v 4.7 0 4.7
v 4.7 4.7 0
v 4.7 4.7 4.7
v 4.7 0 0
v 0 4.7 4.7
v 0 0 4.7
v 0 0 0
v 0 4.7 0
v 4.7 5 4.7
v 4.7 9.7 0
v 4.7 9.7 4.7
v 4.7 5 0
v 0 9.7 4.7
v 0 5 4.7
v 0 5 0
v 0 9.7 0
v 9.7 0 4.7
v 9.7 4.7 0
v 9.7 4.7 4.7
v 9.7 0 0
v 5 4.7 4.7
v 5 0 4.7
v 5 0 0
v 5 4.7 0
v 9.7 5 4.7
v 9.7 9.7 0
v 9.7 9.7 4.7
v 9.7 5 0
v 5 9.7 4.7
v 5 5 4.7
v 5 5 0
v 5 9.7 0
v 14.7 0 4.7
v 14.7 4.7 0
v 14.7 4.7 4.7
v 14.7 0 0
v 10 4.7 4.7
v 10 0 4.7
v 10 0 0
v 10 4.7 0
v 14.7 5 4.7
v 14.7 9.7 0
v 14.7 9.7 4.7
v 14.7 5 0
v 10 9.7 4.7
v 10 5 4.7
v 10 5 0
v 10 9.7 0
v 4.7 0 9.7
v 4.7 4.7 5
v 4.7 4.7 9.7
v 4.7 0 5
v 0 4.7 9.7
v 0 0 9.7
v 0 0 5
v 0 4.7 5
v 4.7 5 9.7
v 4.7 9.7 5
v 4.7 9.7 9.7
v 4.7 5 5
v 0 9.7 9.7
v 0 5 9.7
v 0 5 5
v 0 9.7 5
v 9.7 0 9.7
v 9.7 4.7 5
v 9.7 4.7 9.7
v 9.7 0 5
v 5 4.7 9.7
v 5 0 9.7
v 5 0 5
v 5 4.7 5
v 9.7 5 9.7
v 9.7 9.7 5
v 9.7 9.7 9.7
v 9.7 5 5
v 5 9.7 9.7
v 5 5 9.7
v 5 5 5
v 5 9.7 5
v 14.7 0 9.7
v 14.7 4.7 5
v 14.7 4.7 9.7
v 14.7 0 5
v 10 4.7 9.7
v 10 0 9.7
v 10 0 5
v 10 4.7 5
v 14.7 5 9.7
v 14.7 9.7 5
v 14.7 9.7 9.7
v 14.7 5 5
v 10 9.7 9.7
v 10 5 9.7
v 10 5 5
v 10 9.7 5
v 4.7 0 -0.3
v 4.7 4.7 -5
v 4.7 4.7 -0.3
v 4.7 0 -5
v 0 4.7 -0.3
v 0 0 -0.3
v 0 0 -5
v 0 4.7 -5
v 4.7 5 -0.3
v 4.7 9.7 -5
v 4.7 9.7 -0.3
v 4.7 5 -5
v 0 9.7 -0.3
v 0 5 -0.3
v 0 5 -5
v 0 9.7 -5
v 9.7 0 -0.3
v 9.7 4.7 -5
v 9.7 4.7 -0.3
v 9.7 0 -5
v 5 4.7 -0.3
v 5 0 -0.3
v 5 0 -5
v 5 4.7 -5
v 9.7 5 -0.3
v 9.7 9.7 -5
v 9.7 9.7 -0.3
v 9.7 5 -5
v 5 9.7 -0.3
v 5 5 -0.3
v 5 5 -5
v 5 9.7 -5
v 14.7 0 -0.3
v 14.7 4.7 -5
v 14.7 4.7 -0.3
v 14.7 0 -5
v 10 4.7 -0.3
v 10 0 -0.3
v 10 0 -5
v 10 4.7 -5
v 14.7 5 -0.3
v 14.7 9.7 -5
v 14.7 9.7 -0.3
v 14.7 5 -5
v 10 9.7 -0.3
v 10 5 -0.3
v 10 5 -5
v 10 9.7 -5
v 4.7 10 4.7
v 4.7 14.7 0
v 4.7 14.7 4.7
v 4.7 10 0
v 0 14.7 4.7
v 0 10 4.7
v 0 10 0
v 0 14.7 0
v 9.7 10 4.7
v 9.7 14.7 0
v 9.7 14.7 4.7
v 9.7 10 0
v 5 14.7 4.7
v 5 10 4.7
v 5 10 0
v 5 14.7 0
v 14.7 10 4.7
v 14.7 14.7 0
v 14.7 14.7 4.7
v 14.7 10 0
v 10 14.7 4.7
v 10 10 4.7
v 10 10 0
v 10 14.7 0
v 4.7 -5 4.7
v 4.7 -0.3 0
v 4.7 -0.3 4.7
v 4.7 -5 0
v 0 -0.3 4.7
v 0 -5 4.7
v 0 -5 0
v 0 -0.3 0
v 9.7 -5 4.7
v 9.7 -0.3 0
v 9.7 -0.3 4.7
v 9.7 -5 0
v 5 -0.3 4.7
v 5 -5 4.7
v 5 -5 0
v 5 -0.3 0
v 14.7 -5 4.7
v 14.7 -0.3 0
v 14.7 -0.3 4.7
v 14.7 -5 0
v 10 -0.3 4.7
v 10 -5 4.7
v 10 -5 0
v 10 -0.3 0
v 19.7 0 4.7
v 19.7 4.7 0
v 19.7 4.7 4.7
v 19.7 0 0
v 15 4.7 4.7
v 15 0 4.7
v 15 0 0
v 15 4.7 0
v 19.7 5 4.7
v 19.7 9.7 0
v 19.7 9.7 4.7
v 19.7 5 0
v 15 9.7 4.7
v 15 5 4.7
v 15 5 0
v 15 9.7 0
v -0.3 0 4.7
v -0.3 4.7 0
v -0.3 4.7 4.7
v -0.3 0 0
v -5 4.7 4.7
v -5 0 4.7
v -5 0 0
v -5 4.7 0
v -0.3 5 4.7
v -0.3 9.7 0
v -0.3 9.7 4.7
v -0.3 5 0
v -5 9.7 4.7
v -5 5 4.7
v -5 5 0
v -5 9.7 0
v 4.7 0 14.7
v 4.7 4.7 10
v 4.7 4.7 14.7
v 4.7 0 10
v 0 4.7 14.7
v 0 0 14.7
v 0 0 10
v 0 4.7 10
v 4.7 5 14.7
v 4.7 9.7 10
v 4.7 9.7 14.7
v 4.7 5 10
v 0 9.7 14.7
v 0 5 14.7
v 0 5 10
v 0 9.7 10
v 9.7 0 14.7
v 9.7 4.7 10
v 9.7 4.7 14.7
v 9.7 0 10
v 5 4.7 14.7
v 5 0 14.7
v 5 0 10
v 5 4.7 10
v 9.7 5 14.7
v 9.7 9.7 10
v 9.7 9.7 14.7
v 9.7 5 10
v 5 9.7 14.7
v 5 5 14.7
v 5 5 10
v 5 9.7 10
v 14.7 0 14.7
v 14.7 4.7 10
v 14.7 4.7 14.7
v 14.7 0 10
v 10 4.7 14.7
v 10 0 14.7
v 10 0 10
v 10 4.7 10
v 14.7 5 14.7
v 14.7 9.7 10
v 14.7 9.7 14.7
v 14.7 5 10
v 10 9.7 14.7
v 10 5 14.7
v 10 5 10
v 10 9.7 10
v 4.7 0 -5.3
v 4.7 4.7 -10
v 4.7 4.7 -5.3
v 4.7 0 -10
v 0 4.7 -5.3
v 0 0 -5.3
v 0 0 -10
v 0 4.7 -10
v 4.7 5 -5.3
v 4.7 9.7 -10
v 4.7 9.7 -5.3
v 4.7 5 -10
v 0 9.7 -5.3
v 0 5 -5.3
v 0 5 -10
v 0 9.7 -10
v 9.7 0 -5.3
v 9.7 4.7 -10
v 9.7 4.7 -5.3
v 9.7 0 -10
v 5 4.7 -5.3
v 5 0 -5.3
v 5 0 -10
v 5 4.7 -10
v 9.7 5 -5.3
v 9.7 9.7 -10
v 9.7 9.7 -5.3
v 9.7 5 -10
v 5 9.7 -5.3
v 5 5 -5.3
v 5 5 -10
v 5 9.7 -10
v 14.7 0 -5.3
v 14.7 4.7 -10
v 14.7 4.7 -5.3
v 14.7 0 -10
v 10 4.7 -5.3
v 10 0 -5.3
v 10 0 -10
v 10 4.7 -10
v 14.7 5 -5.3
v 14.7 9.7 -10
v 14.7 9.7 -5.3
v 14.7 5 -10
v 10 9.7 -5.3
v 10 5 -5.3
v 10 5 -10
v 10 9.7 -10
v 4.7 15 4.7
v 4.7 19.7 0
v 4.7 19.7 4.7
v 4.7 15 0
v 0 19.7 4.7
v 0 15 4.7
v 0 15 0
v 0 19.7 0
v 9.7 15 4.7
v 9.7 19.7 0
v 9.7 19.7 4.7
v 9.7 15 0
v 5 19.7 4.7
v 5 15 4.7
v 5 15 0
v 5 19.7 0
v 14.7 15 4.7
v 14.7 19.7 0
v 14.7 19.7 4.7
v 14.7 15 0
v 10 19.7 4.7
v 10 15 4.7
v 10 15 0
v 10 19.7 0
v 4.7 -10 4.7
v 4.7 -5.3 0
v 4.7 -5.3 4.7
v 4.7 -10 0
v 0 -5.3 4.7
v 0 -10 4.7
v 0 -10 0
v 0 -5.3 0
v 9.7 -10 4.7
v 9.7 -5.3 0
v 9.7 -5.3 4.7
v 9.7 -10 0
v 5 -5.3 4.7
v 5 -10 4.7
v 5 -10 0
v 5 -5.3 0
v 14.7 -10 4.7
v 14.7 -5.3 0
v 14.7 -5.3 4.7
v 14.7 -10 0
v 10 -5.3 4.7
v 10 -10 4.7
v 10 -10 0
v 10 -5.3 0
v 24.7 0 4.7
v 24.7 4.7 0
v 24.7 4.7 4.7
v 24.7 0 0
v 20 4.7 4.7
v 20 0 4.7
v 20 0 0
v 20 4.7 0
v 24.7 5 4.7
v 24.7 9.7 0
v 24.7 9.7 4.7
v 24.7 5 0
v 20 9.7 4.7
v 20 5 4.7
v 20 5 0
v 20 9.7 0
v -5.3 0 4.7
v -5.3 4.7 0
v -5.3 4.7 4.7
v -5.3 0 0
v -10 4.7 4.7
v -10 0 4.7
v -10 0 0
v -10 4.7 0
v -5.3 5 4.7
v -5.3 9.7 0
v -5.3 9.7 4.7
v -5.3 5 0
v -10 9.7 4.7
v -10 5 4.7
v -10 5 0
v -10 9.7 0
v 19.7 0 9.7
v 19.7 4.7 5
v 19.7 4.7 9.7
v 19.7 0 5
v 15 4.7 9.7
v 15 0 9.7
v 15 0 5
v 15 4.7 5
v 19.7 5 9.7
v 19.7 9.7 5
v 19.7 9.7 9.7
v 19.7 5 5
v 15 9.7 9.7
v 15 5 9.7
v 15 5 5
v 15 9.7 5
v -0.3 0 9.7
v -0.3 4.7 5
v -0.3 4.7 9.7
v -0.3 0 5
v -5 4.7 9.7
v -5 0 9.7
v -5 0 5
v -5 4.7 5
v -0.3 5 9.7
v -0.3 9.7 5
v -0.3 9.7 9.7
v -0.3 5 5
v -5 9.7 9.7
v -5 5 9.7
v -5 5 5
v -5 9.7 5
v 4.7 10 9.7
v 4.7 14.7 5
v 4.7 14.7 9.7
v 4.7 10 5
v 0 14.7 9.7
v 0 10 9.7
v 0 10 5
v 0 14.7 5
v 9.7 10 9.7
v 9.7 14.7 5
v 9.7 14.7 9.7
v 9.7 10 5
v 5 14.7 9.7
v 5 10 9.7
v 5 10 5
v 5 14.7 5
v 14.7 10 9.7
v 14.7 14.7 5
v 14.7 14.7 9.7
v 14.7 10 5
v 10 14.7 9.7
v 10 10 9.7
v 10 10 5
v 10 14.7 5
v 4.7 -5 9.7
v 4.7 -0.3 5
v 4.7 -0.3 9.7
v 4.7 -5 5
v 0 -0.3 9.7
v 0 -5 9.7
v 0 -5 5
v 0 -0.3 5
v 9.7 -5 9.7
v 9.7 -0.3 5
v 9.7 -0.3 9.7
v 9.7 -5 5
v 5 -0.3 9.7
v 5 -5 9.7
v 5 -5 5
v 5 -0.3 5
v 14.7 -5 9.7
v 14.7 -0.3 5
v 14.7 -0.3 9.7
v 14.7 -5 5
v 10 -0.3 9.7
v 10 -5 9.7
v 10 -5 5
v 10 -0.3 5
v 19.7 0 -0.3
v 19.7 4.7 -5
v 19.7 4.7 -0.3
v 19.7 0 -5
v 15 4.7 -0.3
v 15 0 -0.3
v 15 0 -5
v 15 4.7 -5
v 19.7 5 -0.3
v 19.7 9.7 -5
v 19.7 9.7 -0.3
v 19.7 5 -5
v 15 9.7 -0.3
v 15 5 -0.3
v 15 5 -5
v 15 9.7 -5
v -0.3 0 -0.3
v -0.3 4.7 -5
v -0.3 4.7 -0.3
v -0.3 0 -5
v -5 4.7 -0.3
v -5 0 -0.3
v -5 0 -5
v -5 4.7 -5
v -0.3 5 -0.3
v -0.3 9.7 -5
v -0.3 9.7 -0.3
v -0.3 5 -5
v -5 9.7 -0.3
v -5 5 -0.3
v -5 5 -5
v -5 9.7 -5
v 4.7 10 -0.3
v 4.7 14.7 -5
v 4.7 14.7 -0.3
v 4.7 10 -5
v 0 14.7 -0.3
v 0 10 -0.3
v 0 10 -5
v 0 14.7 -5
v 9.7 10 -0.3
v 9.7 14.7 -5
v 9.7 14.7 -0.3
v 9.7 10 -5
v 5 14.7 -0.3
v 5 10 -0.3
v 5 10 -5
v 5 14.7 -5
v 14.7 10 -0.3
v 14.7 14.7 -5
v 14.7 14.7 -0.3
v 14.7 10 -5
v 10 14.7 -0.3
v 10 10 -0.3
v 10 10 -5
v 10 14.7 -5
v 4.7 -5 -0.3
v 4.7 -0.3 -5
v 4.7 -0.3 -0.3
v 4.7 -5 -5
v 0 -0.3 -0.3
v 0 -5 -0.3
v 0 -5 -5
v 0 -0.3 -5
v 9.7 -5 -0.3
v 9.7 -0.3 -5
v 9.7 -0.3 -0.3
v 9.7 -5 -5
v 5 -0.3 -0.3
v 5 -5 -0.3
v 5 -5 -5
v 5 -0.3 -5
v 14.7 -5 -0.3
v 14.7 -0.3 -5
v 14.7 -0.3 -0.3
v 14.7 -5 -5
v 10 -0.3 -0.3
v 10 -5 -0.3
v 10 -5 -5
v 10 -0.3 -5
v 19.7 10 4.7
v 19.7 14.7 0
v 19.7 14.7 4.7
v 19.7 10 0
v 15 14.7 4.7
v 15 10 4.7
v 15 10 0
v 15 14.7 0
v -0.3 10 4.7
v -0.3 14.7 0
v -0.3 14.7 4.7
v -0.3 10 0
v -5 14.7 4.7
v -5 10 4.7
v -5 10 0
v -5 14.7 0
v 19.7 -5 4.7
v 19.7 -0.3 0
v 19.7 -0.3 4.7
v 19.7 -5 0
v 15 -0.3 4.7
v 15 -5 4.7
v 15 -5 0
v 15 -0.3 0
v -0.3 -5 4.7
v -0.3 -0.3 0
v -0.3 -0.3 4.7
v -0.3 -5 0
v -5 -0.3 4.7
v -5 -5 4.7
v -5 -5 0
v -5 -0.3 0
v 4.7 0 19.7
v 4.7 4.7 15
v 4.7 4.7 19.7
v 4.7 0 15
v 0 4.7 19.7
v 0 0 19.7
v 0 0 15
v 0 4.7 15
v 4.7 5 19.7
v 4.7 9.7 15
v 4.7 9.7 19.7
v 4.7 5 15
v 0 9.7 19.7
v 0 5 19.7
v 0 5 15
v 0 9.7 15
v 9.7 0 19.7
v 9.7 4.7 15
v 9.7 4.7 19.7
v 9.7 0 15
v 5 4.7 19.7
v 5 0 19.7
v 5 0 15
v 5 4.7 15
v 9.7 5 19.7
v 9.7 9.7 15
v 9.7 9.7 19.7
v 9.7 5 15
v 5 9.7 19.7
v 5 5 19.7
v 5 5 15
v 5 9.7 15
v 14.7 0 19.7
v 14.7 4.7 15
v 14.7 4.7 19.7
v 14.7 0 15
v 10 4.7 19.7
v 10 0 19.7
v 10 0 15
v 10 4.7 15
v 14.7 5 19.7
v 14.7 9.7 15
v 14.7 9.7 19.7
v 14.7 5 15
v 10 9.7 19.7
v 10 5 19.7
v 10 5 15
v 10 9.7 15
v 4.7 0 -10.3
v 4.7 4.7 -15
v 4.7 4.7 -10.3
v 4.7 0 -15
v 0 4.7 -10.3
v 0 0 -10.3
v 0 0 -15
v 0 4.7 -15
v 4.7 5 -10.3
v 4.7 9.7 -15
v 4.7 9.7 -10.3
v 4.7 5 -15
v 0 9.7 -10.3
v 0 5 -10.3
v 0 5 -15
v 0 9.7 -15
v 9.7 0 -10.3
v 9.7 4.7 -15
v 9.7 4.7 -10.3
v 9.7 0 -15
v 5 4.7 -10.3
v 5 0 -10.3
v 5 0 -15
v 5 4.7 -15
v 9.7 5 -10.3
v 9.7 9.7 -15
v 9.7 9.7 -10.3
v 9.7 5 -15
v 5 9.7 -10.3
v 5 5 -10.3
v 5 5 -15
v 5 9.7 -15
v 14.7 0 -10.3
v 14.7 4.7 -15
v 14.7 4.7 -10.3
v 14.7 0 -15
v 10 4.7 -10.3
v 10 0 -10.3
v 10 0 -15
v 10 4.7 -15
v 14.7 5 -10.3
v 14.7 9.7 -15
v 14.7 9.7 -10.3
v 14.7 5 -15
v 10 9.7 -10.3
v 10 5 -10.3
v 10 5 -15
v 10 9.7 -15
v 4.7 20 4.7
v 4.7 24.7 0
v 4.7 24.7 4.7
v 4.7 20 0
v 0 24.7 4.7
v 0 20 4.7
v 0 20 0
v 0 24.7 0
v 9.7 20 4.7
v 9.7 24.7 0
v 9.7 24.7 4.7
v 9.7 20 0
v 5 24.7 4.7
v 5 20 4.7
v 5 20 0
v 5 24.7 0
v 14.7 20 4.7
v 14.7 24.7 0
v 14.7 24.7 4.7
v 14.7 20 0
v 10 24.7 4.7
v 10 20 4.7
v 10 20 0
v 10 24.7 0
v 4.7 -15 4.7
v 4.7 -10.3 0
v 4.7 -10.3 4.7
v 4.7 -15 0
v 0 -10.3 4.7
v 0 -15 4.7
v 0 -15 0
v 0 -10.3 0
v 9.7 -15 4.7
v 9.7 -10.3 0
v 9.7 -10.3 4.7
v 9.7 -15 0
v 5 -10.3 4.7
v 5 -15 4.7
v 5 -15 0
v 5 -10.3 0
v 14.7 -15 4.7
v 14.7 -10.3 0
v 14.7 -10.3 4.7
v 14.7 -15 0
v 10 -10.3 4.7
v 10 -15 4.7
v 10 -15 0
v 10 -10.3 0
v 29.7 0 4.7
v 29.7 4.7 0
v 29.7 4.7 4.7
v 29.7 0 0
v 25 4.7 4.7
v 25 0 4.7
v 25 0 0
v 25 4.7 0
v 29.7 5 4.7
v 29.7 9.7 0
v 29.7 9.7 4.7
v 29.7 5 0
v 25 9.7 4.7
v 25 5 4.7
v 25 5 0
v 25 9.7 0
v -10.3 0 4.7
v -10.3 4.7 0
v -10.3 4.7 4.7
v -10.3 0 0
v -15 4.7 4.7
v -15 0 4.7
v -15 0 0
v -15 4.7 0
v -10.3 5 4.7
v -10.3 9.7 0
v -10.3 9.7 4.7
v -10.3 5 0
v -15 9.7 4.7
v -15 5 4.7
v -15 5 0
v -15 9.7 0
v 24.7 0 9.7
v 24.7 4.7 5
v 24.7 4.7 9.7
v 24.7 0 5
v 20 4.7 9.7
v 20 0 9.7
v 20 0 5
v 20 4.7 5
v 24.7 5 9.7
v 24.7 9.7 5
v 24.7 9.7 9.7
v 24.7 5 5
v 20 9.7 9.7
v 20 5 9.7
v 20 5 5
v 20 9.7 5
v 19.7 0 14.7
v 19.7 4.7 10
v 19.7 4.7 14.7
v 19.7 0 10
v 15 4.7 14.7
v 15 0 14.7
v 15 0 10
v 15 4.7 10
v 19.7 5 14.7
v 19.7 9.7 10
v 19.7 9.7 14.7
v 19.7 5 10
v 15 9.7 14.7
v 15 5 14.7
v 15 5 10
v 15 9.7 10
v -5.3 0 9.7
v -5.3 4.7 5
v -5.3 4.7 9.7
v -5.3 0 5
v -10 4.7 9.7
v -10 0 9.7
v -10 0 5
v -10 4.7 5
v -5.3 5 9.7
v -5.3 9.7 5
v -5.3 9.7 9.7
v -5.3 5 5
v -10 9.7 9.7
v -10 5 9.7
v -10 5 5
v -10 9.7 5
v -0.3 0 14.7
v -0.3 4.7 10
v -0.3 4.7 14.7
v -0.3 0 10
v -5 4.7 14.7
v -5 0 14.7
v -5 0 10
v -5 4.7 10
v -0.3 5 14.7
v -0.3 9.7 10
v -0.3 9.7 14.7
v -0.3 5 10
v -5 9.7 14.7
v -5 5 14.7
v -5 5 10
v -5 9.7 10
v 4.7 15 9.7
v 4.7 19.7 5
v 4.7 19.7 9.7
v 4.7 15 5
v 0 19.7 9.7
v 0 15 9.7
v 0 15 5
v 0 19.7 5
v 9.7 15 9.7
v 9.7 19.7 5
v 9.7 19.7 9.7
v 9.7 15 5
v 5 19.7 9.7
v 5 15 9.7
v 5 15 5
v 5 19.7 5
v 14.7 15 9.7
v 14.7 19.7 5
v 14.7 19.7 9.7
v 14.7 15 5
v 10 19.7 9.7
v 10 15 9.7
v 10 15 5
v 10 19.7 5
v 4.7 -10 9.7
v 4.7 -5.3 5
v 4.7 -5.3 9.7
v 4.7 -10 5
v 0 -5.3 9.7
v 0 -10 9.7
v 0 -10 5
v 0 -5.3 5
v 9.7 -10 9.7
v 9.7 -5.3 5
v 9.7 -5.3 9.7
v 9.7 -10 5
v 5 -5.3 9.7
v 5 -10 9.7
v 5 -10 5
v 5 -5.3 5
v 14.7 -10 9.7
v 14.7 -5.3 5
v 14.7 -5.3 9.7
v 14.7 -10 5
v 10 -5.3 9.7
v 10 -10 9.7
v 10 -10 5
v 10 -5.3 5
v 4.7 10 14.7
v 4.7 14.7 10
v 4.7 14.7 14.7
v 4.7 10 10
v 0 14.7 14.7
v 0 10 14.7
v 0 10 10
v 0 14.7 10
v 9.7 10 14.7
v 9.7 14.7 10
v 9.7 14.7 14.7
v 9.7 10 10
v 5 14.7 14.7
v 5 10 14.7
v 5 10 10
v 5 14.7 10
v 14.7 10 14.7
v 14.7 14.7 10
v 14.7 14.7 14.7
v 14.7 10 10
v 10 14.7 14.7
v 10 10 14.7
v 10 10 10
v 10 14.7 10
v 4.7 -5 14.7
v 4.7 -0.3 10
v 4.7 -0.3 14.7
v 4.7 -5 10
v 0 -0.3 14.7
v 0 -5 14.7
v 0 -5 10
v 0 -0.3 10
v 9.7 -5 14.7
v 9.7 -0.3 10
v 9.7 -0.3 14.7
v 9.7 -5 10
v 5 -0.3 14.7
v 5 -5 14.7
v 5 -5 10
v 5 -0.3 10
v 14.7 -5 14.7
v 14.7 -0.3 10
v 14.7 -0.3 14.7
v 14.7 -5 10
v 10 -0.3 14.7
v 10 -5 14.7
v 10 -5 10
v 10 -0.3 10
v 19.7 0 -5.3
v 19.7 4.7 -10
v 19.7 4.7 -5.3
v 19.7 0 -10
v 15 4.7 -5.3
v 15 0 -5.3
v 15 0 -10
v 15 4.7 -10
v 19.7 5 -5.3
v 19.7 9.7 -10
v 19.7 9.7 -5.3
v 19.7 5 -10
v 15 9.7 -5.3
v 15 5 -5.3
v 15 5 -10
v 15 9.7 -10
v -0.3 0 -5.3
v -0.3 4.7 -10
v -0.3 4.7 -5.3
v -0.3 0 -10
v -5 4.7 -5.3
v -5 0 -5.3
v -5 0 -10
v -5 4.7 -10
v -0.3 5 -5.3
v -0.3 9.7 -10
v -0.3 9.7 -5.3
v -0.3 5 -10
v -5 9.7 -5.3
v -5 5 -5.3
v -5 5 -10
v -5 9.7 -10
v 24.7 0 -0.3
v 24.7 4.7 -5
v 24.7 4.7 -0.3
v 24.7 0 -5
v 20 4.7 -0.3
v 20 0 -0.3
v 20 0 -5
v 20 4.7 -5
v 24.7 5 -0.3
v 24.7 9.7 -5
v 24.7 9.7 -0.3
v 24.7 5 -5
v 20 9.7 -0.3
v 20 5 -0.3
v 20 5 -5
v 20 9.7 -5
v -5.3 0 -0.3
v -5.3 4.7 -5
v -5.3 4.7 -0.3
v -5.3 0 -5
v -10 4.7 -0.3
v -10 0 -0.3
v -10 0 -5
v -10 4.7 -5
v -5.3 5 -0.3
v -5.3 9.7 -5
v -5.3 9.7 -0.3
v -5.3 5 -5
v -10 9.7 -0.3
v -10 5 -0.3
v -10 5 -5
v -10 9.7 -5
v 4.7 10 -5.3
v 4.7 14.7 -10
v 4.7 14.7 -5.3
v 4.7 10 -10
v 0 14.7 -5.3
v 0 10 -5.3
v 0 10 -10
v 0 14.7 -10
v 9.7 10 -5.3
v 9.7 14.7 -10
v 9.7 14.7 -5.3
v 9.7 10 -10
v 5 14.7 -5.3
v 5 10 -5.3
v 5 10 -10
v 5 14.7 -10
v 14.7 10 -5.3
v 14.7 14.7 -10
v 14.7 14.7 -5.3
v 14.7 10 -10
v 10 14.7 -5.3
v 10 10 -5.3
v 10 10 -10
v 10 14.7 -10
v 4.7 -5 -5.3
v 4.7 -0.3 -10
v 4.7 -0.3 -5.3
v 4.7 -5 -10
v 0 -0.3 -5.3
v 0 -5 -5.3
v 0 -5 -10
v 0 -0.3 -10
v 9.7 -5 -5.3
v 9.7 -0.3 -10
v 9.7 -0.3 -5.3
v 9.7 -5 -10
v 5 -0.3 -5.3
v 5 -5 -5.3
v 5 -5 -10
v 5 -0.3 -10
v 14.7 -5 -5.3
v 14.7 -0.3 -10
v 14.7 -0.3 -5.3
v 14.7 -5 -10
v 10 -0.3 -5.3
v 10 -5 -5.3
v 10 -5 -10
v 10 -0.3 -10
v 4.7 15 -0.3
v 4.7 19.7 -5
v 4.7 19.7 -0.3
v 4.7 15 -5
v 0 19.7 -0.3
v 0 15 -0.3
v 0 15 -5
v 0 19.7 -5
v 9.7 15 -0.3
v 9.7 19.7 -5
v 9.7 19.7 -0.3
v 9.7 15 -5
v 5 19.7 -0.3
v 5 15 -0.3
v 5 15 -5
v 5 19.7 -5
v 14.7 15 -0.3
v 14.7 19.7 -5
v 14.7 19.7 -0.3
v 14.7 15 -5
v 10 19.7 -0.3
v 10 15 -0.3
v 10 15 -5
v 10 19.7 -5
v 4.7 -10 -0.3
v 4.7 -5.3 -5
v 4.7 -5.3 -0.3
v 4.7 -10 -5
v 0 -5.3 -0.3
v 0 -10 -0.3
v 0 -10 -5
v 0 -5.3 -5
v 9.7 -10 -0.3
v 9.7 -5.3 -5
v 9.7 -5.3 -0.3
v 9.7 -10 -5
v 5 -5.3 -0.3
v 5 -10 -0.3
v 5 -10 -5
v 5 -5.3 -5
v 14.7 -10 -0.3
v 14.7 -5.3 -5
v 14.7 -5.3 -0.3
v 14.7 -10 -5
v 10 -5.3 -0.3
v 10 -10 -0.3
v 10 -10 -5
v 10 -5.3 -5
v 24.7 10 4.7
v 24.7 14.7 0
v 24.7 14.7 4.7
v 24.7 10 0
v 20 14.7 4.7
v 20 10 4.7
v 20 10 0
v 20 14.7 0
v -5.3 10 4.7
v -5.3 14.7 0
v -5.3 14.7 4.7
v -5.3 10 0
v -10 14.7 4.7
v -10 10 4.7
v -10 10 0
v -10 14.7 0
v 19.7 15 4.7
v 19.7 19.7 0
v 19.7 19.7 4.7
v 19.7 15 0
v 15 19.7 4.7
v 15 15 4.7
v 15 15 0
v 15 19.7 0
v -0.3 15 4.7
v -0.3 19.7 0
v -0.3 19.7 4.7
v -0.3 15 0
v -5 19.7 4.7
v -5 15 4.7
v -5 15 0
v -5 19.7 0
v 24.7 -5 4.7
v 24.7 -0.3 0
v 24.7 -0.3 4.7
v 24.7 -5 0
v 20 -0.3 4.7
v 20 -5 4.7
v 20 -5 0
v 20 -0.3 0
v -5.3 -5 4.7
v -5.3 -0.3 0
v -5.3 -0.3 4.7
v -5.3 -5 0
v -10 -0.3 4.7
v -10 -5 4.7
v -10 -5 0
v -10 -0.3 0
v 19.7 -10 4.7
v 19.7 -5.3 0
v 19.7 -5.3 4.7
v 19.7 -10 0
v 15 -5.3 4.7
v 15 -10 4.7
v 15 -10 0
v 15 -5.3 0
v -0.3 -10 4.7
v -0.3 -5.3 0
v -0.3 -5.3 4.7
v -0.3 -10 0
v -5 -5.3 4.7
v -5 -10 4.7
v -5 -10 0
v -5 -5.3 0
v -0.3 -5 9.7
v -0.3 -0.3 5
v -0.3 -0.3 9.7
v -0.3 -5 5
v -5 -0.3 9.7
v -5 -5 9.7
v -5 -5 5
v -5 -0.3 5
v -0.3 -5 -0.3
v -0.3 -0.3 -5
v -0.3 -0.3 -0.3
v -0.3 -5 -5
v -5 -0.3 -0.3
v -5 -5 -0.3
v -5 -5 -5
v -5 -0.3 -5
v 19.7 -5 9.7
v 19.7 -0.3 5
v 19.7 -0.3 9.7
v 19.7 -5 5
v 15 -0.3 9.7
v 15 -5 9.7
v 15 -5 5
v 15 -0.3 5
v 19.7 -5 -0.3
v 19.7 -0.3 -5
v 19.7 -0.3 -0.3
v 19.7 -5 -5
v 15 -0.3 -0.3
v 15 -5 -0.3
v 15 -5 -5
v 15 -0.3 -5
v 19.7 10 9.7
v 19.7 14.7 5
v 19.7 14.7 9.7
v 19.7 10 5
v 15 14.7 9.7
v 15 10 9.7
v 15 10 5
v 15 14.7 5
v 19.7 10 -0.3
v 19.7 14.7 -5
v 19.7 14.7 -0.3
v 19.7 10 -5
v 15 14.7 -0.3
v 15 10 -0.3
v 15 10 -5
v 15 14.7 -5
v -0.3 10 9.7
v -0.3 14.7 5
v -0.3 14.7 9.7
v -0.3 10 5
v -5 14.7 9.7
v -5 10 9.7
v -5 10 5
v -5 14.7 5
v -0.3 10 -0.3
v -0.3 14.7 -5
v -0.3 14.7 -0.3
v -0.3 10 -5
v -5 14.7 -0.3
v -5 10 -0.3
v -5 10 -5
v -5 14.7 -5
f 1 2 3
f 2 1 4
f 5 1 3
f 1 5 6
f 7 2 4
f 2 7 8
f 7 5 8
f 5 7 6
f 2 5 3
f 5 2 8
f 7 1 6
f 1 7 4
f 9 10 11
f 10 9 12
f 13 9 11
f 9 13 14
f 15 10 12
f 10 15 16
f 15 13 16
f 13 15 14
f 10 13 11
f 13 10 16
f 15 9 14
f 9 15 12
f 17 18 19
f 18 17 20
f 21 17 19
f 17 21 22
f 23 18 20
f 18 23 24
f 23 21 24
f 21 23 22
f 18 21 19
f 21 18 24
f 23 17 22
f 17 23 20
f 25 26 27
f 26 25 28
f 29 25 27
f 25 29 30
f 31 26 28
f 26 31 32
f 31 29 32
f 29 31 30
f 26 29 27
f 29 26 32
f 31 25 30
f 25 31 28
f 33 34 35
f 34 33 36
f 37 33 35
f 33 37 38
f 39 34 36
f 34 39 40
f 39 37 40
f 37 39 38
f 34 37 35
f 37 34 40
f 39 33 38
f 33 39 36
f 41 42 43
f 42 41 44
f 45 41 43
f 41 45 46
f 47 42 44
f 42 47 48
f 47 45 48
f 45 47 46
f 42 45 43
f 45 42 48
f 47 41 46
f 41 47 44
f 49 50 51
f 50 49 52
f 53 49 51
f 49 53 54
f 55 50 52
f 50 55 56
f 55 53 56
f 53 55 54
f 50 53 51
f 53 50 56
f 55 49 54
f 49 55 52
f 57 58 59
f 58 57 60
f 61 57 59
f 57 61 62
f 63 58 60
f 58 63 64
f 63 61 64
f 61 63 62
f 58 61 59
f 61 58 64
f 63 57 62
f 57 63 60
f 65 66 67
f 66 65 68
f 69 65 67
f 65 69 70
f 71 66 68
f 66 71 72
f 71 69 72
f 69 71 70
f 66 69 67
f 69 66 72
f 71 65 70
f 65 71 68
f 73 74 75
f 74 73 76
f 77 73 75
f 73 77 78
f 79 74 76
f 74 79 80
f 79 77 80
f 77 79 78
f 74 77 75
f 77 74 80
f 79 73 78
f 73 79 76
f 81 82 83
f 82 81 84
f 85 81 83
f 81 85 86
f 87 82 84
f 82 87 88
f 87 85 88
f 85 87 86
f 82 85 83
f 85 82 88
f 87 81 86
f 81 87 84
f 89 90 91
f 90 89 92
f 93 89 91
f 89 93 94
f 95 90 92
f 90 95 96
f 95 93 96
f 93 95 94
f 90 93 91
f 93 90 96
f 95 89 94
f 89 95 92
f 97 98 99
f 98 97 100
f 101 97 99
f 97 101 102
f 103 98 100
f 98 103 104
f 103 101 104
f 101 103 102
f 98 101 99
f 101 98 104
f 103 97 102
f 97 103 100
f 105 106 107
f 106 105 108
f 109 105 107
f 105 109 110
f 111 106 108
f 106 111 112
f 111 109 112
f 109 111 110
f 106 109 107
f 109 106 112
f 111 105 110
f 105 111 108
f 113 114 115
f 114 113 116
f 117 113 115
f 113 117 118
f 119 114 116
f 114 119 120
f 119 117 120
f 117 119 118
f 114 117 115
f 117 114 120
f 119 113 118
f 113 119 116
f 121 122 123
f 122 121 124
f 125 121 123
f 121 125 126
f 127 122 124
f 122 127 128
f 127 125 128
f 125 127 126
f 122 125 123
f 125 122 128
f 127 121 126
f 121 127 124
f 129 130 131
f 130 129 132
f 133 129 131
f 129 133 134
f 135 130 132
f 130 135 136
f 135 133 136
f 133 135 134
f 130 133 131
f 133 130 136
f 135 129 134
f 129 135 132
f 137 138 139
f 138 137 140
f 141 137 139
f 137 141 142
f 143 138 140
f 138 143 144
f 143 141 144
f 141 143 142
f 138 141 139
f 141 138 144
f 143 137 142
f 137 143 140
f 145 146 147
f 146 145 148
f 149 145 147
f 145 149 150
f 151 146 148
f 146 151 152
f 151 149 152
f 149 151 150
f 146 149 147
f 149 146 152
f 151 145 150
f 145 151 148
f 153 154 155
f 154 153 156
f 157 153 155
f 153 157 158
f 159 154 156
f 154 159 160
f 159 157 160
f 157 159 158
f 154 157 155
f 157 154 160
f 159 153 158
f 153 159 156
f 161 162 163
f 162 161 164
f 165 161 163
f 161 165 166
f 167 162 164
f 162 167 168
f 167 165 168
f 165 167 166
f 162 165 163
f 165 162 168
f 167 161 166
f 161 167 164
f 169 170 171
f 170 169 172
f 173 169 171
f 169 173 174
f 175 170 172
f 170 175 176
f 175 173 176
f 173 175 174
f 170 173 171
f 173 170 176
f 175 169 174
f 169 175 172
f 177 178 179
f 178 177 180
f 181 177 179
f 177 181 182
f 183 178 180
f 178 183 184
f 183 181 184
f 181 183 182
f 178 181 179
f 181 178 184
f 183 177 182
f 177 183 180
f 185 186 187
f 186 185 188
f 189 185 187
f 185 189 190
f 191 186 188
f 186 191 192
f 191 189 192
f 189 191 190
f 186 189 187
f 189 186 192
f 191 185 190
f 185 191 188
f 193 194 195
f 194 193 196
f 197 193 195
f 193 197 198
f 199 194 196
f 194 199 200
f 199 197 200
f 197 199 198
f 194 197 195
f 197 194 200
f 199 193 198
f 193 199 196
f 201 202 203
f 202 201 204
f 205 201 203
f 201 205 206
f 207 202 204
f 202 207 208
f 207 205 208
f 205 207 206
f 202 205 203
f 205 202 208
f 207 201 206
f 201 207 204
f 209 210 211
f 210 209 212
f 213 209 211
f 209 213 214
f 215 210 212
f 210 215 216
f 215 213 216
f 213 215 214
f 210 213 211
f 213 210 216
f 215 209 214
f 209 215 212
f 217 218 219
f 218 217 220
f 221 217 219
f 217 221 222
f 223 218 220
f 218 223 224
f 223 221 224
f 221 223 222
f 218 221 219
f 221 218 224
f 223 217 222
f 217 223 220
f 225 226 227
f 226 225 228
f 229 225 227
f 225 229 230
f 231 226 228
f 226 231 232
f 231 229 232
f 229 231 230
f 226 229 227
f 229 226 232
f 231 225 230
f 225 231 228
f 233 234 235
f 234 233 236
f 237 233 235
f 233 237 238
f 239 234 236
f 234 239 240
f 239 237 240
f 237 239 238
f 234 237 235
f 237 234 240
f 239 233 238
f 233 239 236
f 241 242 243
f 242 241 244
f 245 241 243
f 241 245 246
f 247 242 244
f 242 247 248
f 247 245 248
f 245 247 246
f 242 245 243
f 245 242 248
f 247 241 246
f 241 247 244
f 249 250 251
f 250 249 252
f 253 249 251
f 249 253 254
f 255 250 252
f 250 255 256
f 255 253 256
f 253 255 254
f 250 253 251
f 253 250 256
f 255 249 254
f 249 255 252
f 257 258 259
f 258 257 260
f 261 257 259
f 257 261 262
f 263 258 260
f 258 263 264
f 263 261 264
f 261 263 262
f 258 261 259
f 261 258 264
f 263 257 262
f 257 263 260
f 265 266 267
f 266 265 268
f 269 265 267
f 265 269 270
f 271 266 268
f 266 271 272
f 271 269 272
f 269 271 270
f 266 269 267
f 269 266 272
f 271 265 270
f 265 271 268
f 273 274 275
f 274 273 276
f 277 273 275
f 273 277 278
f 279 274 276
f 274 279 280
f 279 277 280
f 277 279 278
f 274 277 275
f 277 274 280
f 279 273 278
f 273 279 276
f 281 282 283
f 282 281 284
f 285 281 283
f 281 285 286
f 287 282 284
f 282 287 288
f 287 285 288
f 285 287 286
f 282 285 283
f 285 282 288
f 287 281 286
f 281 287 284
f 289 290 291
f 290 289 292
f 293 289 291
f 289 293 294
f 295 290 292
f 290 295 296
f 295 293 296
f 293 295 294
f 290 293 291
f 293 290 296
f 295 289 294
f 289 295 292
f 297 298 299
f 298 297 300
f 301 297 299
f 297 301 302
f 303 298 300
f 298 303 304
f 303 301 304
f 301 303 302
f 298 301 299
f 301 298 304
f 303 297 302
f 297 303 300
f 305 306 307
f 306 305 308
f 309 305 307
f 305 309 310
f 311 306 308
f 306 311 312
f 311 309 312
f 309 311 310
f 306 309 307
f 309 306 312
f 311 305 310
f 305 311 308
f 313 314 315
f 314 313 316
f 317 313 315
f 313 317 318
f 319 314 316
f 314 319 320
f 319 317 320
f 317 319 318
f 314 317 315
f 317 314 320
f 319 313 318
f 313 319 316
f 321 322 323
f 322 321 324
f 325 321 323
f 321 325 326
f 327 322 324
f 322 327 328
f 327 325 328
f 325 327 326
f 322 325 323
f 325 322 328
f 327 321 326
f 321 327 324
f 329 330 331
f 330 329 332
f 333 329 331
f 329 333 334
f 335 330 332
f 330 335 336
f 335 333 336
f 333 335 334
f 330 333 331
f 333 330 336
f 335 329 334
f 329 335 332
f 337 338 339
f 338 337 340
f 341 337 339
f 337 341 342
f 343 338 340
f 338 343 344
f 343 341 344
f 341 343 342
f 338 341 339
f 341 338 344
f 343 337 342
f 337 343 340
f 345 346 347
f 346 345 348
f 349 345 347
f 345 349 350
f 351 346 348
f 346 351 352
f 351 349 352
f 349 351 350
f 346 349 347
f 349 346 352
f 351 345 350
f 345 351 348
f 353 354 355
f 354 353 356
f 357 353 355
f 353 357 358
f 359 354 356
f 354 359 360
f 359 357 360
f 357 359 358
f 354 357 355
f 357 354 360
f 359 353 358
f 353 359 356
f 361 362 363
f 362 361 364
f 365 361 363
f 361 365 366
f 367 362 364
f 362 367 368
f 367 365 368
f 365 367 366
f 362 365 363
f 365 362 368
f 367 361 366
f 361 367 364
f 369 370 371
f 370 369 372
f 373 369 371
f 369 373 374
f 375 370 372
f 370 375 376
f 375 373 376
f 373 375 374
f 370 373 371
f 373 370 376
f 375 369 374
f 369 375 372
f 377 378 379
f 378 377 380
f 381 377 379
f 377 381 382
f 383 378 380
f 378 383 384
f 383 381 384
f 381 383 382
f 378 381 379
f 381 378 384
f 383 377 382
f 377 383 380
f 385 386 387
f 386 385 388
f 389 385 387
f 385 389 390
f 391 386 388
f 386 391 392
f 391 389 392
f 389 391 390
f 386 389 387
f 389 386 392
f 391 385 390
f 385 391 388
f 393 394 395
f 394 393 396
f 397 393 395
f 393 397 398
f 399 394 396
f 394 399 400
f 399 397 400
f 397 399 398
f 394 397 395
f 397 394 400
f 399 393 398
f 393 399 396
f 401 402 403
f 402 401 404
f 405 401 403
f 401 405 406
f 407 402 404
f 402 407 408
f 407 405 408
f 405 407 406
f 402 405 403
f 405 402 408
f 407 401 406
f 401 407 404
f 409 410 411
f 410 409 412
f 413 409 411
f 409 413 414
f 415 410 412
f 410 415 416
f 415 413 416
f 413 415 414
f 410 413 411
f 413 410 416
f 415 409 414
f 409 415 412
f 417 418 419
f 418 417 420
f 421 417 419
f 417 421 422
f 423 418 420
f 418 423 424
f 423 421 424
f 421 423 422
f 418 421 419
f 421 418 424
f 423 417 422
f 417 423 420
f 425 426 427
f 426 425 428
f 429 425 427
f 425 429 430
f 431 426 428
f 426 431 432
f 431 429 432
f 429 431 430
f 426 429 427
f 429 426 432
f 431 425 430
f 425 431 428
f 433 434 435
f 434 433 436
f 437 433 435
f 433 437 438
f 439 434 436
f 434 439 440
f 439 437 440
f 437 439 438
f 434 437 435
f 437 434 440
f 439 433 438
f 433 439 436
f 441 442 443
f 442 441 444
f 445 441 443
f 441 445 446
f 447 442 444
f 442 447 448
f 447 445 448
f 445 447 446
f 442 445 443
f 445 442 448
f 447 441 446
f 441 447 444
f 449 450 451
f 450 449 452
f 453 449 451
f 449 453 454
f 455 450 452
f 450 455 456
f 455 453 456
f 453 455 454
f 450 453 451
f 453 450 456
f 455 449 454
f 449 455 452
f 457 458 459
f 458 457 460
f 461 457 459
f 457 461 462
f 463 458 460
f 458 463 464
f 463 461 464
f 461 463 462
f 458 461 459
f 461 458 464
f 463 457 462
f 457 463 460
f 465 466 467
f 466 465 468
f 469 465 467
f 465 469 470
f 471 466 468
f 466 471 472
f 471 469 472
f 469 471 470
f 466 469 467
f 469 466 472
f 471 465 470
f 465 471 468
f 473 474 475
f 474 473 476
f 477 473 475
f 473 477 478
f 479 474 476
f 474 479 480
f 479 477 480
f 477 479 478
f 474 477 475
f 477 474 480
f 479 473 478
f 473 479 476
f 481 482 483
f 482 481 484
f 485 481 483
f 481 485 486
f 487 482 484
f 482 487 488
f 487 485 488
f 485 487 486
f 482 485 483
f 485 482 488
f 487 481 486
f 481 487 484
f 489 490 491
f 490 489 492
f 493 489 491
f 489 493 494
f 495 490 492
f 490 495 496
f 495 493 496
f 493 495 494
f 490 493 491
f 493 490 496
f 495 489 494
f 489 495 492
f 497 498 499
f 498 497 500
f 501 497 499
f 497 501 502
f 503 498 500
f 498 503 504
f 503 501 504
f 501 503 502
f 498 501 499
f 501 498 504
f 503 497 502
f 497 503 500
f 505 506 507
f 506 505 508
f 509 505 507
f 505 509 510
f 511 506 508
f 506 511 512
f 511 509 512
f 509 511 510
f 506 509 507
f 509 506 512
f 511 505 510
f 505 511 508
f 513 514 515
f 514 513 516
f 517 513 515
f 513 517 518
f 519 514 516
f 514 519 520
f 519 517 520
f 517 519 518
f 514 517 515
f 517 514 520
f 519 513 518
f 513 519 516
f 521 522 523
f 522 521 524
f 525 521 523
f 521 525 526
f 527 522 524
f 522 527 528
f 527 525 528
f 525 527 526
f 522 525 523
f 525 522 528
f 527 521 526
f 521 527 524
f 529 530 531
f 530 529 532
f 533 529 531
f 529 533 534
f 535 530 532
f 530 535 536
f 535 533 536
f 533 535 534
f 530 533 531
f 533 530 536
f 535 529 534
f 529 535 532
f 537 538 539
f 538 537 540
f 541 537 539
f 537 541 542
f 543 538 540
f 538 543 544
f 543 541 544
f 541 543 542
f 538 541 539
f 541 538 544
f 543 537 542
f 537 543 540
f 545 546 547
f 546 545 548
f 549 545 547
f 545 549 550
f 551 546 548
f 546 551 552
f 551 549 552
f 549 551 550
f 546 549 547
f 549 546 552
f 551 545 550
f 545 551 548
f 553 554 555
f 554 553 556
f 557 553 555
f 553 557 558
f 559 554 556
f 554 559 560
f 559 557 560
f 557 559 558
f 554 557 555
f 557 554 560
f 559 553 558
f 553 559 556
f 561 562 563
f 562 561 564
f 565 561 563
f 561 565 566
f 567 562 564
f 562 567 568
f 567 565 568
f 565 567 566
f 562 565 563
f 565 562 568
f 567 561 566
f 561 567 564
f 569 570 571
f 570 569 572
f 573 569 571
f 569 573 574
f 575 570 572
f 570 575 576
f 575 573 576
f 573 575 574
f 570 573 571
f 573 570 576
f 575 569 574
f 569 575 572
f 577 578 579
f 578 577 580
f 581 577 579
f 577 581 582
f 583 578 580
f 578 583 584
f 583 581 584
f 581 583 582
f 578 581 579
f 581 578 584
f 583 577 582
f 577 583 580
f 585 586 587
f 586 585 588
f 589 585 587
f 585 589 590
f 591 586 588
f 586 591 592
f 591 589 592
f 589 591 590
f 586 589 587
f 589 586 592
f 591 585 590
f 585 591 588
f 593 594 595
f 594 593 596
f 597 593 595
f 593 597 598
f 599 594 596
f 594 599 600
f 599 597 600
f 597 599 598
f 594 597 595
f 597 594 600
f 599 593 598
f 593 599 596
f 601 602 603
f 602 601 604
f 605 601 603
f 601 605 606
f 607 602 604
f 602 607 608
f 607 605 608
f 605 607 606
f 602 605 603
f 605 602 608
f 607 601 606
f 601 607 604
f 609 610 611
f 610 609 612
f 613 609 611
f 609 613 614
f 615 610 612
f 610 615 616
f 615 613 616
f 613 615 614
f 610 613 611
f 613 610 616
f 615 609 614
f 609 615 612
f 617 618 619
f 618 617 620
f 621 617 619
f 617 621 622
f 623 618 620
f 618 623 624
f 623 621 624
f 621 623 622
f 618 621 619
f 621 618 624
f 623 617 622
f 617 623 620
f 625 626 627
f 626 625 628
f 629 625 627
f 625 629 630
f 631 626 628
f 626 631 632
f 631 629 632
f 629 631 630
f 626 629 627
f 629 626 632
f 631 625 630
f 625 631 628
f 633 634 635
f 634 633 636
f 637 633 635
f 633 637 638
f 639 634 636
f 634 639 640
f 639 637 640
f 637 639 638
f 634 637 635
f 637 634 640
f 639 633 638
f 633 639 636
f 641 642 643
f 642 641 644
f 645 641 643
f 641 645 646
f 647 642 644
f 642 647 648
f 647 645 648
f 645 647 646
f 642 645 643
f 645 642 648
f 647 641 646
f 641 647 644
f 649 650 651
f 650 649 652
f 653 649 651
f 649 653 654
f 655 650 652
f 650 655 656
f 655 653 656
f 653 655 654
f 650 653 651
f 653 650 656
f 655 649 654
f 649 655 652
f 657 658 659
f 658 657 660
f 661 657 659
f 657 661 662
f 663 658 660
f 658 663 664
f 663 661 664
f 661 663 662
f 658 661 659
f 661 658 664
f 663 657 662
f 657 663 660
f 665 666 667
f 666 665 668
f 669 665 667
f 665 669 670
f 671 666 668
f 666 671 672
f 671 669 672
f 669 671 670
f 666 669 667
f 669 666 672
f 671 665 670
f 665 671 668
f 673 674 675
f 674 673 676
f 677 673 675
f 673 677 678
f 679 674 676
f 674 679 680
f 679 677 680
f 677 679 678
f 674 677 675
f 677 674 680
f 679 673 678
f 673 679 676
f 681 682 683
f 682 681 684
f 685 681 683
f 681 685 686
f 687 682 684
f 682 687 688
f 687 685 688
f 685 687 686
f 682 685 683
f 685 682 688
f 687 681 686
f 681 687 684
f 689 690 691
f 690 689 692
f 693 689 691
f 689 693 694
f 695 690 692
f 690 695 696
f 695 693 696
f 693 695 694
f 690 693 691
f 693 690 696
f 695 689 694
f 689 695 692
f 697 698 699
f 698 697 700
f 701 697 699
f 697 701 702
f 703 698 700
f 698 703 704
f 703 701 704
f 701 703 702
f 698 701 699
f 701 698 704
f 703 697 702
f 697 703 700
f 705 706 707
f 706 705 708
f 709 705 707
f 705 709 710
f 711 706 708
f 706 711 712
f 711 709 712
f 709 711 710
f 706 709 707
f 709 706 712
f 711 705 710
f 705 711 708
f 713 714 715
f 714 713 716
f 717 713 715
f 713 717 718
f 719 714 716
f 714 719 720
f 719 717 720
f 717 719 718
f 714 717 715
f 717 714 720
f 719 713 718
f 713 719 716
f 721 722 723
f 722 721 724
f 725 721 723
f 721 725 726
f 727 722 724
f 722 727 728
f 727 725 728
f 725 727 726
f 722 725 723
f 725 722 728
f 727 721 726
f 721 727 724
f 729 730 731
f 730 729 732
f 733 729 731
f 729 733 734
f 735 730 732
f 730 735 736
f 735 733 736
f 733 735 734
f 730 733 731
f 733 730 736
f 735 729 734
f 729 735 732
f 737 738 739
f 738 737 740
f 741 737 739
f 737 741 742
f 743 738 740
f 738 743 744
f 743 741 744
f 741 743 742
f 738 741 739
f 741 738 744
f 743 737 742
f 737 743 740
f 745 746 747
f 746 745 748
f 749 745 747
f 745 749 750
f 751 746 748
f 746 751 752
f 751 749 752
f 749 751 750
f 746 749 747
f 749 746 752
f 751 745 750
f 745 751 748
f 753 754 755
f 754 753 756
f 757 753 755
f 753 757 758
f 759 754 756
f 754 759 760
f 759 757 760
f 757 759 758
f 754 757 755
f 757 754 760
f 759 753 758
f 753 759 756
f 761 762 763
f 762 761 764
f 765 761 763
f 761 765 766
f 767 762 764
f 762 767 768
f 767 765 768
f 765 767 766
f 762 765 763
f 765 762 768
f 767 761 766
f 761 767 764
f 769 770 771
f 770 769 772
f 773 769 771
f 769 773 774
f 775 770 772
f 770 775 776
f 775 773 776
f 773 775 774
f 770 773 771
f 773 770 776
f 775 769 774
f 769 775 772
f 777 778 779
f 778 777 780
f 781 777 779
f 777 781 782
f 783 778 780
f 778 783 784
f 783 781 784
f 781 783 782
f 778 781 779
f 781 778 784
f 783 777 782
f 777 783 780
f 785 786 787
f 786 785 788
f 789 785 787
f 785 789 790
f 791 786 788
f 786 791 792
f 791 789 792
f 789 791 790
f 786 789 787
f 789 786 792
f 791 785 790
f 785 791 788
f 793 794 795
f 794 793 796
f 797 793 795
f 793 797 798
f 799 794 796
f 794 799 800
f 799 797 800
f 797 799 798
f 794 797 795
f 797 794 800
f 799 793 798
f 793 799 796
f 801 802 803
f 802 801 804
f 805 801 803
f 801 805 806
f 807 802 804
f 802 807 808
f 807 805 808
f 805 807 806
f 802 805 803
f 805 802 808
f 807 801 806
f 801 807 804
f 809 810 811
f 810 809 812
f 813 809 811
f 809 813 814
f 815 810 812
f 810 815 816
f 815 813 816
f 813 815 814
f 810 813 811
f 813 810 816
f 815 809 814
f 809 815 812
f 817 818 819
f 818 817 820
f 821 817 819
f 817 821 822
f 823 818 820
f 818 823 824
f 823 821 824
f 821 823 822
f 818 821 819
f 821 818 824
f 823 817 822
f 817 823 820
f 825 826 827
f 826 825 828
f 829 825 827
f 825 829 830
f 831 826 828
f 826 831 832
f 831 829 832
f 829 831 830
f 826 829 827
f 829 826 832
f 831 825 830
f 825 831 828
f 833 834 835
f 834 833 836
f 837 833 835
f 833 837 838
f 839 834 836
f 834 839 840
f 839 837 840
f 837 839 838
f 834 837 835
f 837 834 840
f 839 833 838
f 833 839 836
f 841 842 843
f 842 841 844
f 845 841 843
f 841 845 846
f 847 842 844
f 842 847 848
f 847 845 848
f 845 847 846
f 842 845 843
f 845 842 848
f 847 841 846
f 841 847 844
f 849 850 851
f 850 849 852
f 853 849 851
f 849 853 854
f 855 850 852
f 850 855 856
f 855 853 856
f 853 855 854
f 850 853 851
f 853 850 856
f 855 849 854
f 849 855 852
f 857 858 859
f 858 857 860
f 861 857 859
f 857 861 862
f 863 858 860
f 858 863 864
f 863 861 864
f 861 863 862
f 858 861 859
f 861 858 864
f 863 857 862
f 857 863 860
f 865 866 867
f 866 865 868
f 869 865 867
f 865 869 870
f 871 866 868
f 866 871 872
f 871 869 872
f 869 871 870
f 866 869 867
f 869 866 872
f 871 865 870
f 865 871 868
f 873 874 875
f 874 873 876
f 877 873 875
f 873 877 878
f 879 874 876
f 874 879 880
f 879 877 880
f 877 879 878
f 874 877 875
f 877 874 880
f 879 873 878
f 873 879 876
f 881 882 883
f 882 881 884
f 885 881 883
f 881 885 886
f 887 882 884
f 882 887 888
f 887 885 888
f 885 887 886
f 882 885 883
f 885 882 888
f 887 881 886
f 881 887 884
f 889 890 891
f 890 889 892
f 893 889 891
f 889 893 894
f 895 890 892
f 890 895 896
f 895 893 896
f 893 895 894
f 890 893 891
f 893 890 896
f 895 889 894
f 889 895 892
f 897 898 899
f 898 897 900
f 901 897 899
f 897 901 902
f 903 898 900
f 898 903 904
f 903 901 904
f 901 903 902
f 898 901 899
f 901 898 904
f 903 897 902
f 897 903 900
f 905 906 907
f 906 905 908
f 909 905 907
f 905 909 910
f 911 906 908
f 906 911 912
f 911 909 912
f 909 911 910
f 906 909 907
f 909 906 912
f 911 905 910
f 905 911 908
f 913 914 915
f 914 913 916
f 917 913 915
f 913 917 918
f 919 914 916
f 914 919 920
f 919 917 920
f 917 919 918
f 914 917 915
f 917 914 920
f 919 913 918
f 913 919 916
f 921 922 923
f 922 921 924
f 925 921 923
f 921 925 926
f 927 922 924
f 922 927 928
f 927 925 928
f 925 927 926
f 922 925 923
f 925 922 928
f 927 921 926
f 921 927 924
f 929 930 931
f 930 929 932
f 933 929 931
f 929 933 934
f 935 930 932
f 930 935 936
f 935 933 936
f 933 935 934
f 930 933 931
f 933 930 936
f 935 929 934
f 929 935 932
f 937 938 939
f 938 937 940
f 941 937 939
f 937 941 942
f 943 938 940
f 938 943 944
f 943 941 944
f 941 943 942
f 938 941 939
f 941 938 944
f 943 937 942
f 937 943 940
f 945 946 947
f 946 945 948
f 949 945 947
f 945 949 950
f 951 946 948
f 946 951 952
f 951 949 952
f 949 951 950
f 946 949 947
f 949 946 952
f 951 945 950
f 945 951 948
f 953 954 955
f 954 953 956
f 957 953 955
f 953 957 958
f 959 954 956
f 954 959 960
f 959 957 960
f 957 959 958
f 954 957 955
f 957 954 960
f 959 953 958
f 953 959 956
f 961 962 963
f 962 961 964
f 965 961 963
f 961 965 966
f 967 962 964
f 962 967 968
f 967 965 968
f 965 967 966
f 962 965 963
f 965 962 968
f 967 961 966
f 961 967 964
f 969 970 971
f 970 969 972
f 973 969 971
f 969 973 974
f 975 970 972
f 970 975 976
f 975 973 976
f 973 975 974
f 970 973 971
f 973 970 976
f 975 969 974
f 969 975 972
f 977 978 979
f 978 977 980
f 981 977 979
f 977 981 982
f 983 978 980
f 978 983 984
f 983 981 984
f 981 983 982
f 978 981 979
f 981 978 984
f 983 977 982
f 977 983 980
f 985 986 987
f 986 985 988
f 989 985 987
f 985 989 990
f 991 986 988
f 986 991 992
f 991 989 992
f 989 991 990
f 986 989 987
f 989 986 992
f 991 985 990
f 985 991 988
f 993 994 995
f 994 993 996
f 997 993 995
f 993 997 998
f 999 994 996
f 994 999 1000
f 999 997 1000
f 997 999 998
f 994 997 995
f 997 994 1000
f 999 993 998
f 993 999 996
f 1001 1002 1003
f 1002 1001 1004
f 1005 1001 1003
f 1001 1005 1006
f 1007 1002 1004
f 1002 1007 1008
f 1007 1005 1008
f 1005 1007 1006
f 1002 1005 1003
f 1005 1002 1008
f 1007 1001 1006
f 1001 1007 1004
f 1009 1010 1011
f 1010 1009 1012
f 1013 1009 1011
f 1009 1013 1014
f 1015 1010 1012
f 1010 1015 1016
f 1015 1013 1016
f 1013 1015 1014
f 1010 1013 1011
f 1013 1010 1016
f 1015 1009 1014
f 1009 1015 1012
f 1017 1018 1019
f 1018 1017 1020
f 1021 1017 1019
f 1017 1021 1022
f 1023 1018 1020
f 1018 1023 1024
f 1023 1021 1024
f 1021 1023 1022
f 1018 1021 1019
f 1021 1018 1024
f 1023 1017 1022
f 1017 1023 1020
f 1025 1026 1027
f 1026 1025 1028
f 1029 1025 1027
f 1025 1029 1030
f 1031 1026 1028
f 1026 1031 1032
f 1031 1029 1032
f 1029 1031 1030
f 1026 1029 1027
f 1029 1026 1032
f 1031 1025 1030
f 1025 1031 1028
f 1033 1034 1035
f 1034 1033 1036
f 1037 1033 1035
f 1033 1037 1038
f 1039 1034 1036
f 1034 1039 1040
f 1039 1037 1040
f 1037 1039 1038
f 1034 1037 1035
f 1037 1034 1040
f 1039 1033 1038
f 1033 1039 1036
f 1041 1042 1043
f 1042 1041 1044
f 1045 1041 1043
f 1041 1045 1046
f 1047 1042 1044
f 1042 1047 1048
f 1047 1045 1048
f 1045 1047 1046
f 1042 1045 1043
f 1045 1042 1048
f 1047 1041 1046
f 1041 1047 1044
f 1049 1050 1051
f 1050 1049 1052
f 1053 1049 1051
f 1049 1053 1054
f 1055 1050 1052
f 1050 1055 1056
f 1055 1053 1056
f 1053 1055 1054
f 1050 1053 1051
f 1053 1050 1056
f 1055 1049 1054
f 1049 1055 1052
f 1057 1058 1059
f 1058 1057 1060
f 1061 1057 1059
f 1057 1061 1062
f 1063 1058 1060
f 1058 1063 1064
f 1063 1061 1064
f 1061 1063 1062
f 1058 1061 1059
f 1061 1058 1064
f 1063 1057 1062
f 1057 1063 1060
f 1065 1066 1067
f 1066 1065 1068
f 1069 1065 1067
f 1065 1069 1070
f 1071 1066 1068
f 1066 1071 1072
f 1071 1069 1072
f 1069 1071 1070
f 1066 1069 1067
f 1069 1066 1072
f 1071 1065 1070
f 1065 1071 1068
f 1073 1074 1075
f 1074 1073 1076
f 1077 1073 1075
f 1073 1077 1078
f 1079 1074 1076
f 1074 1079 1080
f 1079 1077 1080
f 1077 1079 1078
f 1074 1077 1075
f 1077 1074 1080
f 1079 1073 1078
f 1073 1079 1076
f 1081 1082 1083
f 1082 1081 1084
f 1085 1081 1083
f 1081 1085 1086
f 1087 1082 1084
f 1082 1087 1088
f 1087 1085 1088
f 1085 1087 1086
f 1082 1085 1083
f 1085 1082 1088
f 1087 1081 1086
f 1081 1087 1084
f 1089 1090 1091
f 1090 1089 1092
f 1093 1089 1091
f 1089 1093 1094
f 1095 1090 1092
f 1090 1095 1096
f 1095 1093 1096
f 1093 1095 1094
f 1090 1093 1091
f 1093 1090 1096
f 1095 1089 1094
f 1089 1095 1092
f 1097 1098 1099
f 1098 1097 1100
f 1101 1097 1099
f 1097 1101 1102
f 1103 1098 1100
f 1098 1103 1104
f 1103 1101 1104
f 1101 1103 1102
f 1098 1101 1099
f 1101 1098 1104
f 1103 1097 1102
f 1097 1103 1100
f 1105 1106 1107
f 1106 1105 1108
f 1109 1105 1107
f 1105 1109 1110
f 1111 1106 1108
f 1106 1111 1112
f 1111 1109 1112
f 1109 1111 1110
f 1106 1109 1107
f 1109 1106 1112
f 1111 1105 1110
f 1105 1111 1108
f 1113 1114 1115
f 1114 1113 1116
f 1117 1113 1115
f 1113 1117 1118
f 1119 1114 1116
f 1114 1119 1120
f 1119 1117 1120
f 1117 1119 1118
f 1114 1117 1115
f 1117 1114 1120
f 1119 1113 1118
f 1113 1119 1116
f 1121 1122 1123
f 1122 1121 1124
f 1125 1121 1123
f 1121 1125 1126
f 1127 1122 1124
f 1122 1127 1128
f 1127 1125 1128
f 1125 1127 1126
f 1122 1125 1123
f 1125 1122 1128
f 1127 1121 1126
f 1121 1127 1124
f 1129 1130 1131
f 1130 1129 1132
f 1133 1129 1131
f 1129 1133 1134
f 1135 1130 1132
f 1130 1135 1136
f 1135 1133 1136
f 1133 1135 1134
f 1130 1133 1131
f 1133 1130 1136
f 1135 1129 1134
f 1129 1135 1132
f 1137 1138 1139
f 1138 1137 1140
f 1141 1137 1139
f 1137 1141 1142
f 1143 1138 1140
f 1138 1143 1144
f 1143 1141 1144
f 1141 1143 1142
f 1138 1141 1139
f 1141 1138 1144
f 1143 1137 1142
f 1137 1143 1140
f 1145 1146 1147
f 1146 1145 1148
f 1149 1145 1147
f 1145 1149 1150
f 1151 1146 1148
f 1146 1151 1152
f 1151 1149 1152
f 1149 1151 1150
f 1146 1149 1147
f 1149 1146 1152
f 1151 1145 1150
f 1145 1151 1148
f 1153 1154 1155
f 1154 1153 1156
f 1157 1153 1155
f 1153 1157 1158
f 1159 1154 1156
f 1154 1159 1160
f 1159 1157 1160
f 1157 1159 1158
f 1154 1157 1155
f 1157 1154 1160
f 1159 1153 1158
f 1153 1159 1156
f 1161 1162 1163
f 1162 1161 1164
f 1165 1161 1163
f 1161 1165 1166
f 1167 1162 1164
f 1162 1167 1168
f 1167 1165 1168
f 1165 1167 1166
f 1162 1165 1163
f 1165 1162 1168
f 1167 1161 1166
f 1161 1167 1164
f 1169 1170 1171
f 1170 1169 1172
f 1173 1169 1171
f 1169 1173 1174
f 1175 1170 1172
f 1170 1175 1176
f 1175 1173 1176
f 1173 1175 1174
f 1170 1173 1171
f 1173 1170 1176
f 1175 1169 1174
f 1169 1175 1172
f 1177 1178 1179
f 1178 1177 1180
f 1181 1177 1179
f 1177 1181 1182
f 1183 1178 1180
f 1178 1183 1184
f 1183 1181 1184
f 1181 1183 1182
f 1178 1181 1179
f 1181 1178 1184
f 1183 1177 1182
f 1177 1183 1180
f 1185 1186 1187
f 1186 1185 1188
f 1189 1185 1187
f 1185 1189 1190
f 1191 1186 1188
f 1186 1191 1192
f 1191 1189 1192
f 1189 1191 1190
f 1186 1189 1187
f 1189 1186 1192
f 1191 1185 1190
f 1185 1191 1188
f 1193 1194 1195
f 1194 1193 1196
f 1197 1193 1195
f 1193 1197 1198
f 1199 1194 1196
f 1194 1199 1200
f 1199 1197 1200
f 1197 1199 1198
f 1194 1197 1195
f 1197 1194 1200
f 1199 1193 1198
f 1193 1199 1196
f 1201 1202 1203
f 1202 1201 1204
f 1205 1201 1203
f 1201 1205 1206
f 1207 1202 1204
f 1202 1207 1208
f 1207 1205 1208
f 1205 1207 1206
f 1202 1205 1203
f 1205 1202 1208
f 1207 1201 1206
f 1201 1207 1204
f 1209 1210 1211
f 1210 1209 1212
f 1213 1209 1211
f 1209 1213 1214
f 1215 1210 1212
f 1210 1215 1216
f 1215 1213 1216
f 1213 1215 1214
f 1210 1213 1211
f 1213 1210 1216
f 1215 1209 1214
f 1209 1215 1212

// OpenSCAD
da = 3;
db = 2;
dc = 1;

side = 5;
gap = 0.3;


module l(size, col="cyan") {
    color(col)
    for (x = [1:size[0]]) {
        for (y = [1:size[1]]) {
            for (z = [1:size[2]]) {
                translate([side*(x-1), side*(y-1), side*(z-1)])
                cube(side-gap);
            }
        }
    }
}



module l0(a, b, c, col="cyan") {
    color(col)
    for (x = [1:a]) {
        for (y = [1:b]) {
            for (z = [1:c]) {
                translate([side*(x-1), side*(y-1), side*(z-1)])
                cube(side-gap);
            }
        }
    }
}

module l1(a, b, c) {
    col = "blue";
    translate([0, 0, side*c])
    l0(a, b, 1, col);
    translate([0, 0, -side])
    l0(a, b, 1, col);
    
    translate([0, side*b, 0])
    l0(a, 1, c, col);
    translate([0, -side, 0])
    l0(a, 1, c, col);
    
    translate([side*a, 0, 0])
    l0(1, b, c, col);
    translate([-side, 0, 0])
    l0(1, b, c, col);
}


module l2(a, b, c) {
    col = "red";
 
    translate([0, 0, side*(c+1)])
    l0(a, b, 1, col);
    translate([0, 0, -side*2])
    l0(a, b, 1, col);
    
    translate([0, side*(b+1), 0])
    l0(a, 1, c, col);
    translate([0, -side*2, 0])
    l0(a, 1, c, col);
    
    translate([side*(a+1), 0, 0])
    l0(1, b, c, col);
    translate([-side*2, 0, 0])
    l0(1, b, c, col); 
    //==================================
    translate([a*side, 0, c*side])
    l0(1, b, 1, col);
    translate([-side, 0, c*side])
    l0(1, b, 1, col);

    translate([0, b*side, c*side])
    l0(a, 1, 1, col);
    translate([0, -side, c*side])
    l0(a, 1, 1, col);

    translate([a*side, 0, -side])
    l0(1, b, 1, col);
    translate([-side, 0, -side])
    l0(1, b, 1, col);

    translate([0, b*side, -side])
    l0(a, 1, 1, col);
    translate([0, -side, -side])
    l0(a, 1, 1, col);

    translate([a*side, b*side, 0])
    l0(1, 1, c, col);
    translate([-side, b*side, 0])
    l0(1, 1, c, col);

    translate([a*side, -side, 0])
    l0(1, 1, c, col);
    translate([-side, -side, 0])
    l0(1, 1, c, col);
}

module l3(a, b, c) {
    col = "green";
 
    translate([0, 0, side*(c+2)])
    l0(a, b, 1, col);
    translate([0, 0, -side*3])
    l0(a, b, 1, col);
    
    translate([0, side*(b+2), 0])
    l0(a, 1, c, col);
    translate([0, -side*3, 0])
    l0(a, 1, c, col);
    
    translate([side*(a+2), 0, 0])
    l0(1, b, c, col);
    translate([-side*3, 0, 0])
    l0(1, b, c, col); 
    //==================================
    translate([(a+1)*side, 0, c*side])
    l0(1, b, 1, col);
    translate([a*side, 0, (c+1)*side])
    l0(1, b, 1, col);
    translate([-side*2, 0, c*side])
    l0(1, b, 1, col);
    translate([-side, 0, (c+1)*side])
    l0(1, b, 1, col);

    translate([0, (b+1)*side, c*side])
    l0(a, 1, 1, col);
    translate([0, -side*2, c*side])
    l0(a, 1, 1, col);
    translate([0, b*side, (c+1)*side])
    l0(a, 1, 1, col);
    translate([0, -side, (c+1)*side])
    l0(a, 1, 1, col);

    translate([a*side, 0, -side*2])
    l0(1, b, 1, col);
    translate([-side, 0, -side*2])
    l0(1, b, 1, col);
    translate([(a+1)*side, 0, -side])
    l0(1, b, 1, col);
    translate([-side*2, 0, -side])
    l0(1, b, 1, col);

    translate([0, b*side, -side*2])
    l0(a, 1, 1, col);
    translate([0, -side, -side*2])
    l0(a, 1, 1, col);
    translate([0, (b+1)*side, -side])
    l0(a, 1, 1, col);
    translate([0, -side*2, -side])
    l0(a, 1, 1, col);

    translate([(a+1)*side, b*side, 0])
    l0(1, 1, c, col);
    translate([-side*2, b*side, 0])
    l0(1, 1, c, col);
    translate([a*side, (b+1)*side, 0])
    l0(1, 1, c, col);
    translate([-side, (b+1)*side, 0])
    l0(1, 1, c, col);

    translate([(a+1)*side, -side, 0])
    l0(1, 1, c, col);
    translate([-side*2, -side, 0])
    l0(1, 1, c, col);
    translate([a*side, -side*2, 0])
    l0(1, 1, c, col);
    translate([-side, -side*2, 0])
    l0(1, 1, c, col);
    
    // corners
    translate([-side, -side, side])
    l0(1, 1, 1, col);
    translate([-side, -side, -side])
    l0(1, 1, 1, col);

    translate([a*side, -side, side])
    l0(1, 1, 1, col);
    translate([a*side, -side, -side])
    l0(1, 1, 1, col);

    translate([a*side, b*side, side])
    l0(1, 1, 1, col);
    translate([a*side, b*side, -side])
    l0(1, 1, 1, col);

    translate([-side, b*side, side])
    l0(1, 1, 1, col);
    translate([-side, b*side, -side])
    l0(1, 1, 1, col);
}

l0(da, db, dc);
l1(da, db, dc);
l2(da, db, dc);
l3(da, db, dc);
